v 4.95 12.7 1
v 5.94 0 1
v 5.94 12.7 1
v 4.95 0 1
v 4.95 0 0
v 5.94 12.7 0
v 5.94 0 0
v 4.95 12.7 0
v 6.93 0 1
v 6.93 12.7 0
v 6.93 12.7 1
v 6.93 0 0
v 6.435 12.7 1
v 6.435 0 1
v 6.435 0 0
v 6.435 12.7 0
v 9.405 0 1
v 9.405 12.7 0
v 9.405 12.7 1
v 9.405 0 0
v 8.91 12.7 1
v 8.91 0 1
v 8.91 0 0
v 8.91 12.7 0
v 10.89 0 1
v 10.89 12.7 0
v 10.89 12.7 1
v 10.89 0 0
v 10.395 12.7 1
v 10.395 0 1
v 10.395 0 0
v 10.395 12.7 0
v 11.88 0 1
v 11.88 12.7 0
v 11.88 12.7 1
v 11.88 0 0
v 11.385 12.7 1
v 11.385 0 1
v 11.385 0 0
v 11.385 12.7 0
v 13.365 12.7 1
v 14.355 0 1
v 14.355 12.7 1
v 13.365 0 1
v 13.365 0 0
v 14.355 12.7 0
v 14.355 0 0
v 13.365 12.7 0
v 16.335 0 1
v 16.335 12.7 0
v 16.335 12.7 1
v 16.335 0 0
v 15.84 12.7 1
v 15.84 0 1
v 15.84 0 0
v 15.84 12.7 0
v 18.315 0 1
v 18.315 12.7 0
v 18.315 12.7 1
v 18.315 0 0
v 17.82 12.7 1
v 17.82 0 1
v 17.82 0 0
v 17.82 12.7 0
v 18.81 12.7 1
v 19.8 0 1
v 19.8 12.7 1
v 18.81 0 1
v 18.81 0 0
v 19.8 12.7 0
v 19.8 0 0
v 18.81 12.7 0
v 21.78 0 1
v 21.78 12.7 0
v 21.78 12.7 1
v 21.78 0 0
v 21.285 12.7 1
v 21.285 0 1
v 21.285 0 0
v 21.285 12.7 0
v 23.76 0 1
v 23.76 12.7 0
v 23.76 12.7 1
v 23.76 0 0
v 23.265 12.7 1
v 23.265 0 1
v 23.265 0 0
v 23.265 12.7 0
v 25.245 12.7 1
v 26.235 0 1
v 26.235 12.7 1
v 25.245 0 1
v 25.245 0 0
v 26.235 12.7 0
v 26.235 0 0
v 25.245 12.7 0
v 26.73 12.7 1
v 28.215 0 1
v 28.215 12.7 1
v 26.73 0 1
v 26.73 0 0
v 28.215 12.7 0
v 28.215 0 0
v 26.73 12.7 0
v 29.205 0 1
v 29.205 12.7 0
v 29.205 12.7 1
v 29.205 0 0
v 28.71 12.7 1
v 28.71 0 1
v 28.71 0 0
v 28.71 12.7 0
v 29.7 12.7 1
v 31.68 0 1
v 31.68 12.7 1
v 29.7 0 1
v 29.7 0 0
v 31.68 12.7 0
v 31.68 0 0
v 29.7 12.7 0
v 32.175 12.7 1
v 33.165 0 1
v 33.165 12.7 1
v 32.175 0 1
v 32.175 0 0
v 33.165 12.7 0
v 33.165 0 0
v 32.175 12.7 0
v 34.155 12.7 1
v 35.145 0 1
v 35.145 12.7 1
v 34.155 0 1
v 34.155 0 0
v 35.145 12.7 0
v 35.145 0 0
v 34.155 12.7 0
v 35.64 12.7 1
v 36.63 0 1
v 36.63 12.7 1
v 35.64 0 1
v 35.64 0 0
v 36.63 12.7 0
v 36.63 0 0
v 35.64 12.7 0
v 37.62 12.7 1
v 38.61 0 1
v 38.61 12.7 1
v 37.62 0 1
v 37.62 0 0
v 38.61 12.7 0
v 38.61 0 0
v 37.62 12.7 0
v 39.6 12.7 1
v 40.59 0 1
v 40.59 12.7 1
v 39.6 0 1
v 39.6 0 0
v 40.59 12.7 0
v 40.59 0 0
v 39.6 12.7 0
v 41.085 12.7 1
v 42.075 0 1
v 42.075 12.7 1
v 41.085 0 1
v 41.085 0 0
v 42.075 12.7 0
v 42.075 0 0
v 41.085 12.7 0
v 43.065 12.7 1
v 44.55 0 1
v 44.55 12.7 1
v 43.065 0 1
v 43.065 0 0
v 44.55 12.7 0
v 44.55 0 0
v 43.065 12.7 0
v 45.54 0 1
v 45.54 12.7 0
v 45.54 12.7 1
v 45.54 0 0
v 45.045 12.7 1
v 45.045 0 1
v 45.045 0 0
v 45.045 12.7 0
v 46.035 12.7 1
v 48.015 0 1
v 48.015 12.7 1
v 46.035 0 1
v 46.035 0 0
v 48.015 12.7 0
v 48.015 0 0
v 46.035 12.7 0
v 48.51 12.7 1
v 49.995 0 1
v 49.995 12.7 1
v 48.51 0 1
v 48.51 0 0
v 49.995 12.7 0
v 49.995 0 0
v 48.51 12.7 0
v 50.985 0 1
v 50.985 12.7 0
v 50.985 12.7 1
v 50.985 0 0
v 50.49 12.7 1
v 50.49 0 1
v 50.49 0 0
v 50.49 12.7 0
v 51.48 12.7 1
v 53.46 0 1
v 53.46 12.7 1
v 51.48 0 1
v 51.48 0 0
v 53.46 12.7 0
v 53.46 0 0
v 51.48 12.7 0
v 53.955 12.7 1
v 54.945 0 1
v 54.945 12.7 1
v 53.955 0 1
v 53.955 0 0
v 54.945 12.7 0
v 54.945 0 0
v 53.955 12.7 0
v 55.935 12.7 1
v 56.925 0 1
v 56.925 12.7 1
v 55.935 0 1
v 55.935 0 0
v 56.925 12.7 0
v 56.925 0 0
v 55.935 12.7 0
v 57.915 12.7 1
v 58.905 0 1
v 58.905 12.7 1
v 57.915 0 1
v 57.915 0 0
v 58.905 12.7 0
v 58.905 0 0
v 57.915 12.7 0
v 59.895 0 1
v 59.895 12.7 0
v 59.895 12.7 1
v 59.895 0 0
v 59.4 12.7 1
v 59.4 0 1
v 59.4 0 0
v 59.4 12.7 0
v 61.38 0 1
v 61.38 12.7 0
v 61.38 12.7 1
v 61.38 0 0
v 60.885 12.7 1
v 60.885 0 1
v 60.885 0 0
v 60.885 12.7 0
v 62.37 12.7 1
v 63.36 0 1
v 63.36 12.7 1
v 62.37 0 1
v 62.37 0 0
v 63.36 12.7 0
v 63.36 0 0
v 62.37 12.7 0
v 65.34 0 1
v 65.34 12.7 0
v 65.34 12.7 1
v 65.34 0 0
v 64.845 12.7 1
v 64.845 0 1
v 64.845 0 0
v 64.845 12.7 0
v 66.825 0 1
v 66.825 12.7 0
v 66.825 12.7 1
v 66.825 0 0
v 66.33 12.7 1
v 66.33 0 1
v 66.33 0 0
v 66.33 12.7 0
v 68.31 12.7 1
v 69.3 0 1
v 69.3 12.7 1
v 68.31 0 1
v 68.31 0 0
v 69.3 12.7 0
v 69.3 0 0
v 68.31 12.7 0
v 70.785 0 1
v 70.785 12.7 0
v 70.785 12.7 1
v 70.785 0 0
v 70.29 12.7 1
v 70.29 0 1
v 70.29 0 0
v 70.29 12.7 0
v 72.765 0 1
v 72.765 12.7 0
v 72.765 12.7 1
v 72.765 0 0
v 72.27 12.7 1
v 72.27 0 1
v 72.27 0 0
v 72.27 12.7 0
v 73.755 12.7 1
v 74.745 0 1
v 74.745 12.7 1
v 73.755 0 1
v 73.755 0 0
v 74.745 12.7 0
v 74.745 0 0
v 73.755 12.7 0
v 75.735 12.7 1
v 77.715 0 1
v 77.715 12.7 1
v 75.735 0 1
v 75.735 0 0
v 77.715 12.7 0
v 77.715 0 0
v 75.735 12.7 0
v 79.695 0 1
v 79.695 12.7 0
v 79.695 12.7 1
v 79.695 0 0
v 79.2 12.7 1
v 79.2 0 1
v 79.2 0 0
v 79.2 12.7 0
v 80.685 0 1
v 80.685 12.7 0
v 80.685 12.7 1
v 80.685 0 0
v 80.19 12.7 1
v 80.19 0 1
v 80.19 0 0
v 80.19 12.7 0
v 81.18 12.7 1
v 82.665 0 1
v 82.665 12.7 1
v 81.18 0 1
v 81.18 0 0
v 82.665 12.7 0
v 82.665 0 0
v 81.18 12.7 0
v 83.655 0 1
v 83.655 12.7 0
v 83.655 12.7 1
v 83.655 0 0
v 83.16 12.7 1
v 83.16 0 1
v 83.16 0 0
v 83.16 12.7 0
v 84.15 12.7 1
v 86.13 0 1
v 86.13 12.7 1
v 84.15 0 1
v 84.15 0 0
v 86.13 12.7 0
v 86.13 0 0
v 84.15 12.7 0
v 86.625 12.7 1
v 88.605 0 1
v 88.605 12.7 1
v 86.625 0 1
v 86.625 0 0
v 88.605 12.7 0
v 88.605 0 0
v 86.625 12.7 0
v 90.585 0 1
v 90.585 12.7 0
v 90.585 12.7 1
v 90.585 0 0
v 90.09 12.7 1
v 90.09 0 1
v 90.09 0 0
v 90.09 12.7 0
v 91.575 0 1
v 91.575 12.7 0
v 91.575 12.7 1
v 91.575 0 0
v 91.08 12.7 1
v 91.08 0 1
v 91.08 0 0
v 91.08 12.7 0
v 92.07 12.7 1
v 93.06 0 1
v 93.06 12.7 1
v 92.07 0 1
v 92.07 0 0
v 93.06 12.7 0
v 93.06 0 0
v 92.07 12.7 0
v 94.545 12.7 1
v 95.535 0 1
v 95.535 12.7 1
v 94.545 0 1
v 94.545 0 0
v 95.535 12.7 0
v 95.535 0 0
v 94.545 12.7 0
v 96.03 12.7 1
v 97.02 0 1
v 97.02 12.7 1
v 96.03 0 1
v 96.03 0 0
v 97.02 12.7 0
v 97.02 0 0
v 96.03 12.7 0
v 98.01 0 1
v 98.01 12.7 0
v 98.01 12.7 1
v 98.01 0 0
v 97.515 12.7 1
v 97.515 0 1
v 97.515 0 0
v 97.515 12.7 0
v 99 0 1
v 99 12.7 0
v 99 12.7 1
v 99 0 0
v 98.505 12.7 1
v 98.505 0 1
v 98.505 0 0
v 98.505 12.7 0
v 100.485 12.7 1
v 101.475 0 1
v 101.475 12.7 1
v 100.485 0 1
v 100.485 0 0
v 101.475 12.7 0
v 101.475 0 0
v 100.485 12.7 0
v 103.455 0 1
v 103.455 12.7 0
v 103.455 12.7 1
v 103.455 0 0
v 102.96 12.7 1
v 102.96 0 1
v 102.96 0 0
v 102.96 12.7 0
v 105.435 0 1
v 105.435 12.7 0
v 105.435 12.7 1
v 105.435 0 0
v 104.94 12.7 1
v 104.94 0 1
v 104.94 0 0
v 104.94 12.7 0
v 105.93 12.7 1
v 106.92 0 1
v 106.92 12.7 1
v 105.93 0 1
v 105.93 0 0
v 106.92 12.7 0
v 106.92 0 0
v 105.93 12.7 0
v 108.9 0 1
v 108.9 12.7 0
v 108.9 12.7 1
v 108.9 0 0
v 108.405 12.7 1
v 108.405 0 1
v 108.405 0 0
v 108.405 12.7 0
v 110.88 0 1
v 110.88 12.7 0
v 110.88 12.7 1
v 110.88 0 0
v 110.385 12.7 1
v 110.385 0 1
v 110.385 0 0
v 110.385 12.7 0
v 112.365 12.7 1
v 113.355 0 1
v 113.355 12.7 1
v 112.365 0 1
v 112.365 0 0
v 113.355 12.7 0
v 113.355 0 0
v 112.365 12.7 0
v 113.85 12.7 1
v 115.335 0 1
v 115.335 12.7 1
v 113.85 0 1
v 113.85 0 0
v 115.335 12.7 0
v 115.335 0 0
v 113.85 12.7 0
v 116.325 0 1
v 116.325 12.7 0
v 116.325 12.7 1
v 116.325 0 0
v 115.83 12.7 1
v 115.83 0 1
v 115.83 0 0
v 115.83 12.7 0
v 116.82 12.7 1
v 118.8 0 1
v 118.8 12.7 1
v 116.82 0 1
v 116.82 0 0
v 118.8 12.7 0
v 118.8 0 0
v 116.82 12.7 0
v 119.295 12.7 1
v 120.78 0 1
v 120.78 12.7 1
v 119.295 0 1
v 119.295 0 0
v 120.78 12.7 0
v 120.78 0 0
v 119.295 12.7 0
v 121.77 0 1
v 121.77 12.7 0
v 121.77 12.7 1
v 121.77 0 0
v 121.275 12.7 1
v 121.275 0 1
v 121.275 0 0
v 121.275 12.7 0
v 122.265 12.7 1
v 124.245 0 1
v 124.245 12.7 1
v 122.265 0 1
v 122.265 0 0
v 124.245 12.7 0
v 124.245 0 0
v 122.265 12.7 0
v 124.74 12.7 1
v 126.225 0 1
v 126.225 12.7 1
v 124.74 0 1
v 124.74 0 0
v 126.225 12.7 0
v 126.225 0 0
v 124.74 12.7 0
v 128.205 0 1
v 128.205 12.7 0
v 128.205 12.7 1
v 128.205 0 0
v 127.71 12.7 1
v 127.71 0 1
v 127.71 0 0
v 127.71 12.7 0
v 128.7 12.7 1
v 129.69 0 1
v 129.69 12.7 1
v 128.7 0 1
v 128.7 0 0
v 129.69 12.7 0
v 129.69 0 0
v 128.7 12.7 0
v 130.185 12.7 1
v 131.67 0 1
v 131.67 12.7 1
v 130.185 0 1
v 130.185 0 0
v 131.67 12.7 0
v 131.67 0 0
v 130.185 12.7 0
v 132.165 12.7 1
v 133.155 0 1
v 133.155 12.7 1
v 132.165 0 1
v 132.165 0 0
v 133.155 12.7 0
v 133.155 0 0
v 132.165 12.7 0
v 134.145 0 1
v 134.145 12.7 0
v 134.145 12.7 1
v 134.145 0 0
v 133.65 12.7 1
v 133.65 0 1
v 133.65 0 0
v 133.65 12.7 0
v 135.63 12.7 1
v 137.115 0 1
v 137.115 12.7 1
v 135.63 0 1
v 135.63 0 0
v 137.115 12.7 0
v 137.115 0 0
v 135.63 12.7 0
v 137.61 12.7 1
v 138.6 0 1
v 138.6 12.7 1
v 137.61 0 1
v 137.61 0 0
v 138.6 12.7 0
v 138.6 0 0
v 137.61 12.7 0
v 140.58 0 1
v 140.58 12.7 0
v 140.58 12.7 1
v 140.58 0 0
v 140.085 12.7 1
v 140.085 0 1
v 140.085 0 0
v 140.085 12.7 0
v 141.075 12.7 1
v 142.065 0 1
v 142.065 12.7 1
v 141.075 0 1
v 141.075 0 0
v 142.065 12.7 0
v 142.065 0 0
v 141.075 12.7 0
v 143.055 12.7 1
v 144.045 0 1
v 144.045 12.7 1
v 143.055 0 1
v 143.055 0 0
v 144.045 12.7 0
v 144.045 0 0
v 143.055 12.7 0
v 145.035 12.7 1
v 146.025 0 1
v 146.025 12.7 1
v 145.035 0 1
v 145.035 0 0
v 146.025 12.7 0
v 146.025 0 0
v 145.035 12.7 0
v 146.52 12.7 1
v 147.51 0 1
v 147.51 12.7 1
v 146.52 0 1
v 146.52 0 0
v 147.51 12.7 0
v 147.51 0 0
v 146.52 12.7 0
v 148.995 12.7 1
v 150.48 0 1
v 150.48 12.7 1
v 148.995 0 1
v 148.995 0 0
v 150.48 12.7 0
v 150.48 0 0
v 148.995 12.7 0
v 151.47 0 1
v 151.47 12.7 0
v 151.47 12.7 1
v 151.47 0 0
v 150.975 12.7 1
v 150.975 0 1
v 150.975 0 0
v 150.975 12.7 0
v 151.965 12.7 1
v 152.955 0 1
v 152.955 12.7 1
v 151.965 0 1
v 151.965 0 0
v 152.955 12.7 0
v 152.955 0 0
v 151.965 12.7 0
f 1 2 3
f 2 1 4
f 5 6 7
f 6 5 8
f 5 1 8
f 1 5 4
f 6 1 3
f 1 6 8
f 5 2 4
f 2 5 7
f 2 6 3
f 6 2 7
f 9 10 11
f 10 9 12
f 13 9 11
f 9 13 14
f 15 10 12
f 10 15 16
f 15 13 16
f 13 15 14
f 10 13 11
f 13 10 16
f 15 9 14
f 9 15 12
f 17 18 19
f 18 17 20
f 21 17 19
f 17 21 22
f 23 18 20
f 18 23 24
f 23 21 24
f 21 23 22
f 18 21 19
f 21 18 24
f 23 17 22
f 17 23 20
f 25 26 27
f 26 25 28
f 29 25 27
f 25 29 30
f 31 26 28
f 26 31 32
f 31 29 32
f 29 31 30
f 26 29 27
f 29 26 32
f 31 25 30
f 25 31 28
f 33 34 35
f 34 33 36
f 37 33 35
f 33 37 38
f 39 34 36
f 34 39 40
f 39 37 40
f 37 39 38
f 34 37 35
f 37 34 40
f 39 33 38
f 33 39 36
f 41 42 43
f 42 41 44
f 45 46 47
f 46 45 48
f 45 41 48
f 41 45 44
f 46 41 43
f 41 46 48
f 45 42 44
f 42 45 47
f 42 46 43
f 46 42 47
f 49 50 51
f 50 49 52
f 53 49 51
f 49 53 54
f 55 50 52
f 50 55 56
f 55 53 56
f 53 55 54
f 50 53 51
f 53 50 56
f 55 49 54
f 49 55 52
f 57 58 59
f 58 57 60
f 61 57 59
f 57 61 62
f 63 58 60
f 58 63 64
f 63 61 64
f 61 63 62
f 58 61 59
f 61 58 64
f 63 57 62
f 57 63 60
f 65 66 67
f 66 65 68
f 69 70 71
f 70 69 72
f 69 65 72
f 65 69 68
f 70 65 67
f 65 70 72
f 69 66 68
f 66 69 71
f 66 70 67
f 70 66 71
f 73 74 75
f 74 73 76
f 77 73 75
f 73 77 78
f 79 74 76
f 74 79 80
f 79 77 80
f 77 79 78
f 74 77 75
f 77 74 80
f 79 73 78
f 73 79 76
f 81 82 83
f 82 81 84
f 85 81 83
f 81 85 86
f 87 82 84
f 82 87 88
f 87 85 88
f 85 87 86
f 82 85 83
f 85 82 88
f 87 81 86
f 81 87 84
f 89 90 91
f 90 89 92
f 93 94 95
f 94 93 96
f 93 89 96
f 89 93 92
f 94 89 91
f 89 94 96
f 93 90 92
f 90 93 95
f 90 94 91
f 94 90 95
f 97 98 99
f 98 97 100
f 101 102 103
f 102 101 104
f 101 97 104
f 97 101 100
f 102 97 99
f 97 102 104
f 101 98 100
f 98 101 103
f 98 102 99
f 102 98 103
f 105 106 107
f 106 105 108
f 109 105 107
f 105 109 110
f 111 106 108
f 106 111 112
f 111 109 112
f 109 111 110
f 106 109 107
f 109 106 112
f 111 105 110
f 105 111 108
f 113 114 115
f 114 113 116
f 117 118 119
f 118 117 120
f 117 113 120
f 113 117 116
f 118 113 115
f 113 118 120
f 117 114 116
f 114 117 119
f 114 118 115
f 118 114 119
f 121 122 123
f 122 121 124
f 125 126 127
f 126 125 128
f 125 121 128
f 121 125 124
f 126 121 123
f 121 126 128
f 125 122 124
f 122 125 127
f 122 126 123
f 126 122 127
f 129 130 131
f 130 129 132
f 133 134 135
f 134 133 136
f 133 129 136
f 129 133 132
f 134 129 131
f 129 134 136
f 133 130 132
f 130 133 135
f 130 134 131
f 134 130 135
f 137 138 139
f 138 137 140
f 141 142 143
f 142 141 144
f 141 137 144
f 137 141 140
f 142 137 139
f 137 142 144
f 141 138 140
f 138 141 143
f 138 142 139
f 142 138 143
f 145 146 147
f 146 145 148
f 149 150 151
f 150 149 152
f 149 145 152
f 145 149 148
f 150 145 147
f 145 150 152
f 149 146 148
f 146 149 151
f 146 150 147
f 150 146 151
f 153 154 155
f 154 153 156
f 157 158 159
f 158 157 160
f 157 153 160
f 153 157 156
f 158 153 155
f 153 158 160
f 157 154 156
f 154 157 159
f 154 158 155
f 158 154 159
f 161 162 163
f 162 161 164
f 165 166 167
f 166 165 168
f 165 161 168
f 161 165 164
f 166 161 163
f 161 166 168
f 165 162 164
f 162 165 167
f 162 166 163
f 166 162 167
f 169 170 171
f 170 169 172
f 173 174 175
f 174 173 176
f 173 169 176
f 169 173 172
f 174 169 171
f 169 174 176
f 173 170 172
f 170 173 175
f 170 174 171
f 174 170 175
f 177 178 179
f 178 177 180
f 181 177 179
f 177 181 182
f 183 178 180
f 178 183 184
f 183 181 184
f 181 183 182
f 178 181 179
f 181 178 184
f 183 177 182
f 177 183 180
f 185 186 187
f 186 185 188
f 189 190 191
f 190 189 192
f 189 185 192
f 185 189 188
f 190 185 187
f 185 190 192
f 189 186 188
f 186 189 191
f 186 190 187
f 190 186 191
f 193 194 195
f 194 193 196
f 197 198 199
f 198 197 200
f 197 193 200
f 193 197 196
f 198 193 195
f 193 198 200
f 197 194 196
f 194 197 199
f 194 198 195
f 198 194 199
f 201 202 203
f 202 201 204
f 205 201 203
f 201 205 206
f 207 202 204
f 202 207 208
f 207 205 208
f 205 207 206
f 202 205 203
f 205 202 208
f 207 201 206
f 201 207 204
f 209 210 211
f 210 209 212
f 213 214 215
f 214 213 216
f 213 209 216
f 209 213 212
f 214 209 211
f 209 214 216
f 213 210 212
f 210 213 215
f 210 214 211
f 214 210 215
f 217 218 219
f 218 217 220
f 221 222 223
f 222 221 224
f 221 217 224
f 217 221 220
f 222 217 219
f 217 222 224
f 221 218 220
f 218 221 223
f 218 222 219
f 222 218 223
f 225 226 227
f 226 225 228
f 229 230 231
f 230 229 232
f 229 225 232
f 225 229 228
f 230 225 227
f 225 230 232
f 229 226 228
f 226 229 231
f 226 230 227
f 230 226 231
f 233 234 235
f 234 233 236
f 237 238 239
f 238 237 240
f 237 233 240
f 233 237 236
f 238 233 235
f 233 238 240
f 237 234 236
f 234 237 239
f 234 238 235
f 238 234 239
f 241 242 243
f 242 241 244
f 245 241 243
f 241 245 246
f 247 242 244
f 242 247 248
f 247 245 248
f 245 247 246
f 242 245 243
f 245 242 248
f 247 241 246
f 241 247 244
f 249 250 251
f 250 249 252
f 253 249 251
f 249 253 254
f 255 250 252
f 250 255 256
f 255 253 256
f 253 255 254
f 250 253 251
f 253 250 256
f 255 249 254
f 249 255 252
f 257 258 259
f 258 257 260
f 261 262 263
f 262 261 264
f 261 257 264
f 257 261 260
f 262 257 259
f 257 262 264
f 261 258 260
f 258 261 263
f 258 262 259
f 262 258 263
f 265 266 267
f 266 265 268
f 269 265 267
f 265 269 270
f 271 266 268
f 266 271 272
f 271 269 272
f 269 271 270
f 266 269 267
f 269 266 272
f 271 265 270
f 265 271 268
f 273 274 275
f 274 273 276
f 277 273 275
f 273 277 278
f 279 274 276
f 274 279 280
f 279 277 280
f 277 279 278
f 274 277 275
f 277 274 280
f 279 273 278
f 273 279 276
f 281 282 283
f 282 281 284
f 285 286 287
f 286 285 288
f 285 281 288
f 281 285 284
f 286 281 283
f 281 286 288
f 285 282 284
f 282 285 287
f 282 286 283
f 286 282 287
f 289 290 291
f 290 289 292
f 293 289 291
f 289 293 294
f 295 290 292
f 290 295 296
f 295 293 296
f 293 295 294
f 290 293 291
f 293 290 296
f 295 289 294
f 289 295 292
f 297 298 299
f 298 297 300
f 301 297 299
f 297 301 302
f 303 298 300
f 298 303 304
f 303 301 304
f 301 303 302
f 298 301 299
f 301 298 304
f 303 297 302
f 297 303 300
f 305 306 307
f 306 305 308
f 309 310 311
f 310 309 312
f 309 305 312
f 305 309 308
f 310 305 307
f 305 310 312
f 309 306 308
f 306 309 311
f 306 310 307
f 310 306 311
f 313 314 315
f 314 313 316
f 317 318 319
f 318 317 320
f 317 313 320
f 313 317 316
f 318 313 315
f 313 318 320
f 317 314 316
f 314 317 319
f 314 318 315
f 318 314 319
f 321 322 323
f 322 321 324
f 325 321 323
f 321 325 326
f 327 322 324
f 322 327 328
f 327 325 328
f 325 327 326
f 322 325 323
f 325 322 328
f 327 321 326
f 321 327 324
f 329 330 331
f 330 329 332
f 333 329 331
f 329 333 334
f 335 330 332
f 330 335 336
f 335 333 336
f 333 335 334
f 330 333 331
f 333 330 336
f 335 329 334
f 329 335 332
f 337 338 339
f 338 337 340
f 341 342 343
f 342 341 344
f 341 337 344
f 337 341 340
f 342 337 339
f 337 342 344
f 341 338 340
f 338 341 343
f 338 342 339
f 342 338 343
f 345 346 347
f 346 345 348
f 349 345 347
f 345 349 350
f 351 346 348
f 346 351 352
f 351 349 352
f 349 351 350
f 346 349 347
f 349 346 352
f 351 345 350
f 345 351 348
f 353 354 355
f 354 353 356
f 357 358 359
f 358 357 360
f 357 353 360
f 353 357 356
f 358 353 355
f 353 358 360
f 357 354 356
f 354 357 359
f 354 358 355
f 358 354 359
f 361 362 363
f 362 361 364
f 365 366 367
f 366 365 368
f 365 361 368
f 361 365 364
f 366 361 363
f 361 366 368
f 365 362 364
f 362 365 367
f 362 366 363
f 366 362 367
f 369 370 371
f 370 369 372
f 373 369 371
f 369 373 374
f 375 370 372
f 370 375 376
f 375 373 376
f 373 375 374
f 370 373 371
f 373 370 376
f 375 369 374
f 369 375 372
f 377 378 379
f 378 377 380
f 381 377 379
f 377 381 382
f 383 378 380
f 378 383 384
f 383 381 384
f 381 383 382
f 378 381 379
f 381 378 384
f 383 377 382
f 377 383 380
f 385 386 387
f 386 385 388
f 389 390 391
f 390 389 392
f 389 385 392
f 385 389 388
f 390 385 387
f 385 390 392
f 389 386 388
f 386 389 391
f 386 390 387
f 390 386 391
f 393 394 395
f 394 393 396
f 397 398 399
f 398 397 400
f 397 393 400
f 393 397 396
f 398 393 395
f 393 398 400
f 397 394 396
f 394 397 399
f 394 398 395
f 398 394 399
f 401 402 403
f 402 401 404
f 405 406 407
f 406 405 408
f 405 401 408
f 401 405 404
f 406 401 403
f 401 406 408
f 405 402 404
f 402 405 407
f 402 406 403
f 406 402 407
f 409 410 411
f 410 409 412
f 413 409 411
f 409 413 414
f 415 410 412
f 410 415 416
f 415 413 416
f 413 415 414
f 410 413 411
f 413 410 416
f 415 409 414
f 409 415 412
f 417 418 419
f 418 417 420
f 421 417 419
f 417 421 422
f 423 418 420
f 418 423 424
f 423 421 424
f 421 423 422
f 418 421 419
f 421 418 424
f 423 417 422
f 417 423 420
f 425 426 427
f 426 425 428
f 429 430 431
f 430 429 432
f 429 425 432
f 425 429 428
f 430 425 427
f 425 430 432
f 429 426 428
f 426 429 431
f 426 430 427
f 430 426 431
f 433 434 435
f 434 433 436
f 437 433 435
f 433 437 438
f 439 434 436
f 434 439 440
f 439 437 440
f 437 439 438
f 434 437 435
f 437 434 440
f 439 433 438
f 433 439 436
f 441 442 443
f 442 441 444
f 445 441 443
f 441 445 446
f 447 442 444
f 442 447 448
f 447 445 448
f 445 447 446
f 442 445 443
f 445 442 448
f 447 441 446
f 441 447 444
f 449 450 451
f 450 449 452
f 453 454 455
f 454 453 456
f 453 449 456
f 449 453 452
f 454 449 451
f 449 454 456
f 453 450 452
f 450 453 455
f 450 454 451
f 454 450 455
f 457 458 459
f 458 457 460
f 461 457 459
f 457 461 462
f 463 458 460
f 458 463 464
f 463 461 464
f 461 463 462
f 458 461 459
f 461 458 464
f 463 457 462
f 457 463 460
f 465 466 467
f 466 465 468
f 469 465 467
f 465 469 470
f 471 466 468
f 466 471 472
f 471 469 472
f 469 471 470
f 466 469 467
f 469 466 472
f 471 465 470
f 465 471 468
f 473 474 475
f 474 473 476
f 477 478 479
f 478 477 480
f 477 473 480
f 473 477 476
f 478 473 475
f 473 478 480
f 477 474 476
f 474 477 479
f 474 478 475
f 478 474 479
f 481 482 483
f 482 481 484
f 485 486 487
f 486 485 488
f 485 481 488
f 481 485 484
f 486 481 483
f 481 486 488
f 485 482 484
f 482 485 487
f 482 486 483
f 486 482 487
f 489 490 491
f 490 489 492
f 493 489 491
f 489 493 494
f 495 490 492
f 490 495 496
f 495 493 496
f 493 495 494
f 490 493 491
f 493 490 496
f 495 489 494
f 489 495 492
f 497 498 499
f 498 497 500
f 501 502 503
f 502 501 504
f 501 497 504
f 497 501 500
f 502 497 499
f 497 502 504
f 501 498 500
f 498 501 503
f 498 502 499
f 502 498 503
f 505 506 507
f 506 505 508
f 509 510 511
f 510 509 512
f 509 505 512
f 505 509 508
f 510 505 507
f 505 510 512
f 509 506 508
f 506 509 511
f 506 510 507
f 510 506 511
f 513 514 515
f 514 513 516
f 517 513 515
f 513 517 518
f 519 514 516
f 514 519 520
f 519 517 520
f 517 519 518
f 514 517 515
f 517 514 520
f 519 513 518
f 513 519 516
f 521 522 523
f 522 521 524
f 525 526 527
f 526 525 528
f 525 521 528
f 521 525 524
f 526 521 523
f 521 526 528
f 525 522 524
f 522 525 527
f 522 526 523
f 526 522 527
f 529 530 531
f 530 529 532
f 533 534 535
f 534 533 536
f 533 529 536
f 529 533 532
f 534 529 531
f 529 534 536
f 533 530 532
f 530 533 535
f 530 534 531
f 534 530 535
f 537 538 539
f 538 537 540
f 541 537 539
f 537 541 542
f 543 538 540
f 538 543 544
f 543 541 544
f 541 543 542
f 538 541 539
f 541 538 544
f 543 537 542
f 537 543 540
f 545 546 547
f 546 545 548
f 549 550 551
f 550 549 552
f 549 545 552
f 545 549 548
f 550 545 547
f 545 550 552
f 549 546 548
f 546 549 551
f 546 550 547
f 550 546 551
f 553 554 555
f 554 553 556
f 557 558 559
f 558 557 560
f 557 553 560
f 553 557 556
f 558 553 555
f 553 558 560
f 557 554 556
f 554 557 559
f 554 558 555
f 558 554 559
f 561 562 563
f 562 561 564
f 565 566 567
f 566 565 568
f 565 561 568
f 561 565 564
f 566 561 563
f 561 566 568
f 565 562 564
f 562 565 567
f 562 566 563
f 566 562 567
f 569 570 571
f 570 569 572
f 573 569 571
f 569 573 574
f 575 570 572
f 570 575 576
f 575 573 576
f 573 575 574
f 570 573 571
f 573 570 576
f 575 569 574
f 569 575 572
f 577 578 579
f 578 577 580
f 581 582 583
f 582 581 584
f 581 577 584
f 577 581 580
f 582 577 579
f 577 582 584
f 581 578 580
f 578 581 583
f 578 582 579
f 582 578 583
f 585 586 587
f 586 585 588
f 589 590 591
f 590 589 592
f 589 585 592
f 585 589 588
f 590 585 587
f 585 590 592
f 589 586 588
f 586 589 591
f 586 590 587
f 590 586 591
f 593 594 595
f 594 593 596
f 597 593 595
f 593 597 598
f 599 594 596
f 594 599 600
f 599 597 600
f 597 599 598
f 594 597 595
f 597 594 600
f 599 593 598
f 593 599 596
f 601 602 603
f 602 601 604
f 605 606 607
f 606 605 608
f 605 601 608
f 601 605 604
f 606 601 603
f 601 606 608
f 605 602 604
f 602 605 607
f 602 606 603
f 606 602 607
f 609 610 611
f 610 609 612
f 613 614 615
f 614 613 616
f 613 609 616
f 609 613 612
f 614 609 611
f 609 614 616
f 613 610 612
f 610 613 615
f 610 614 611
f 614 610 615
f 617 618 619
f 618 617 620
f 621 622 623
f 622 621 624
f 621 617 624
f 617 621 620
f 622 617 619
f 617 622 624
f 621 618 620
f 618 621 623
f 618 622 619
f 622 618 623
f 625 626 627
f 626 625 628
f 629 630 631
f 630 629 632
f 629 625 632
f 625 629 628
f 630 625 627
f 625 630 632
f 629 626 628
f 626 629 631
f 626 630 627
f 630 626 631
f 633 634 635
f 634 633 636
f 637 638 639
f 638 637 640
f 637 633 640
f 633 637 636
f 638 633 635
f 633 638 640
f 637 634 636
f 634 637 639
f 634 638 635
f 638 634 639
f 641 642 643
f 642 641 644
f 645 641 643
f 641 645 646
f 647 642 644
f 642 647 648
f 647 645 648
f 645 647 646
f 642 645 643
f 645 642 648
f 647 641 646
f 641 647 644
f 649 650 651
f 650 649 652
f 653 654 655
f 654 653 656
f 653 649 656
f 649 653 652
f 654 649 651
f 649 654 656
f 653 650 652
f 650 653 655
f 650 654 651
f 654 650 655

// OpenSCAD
// file: ../../util/bitmap.scad
/*****************************************************************************
 * Module Bitmap Library
 * Modules to create bitmaps of unit squares from 1 or 2 dimensional vectors.
 *****************************************************************************
 * Copyright 2017 Chris Baker
 *
 * This program is free software: you can redistribute it and/or modify
 * it under the terms of the GNU Lesser General Public License as published by
 * the Free Software Foundation, either version 3 of the License, or
 * (at your option) any later version.
 *
 * This program is distributed in the hope that it will be useful,
 * but WITHOUT ANY WARRANTY; without even the implied warranty of
 * MERCHANTABILITY or FITNESS FOR A PARTICULAR PURPOSE.  See the
 * GNU Lesser General Public License for more details.
 *
 * You should have received a copy of the GNU Lesser General Public License
 * along with this program.  If not, see <http://www.gnu.org/licenses/>.
 *****************************************************************************
 * Usage:
 * Include this file with the "use" tag.
 * Depends on compat.scad library.
 *
 * API:
 *   1dbitmap(bitmap, center, expansion, vector_mode)
 *   2dbitmap(bitmap, center, expansion, vector_mode)
 *     Generate a 1 or 2-Dimensional field of modules based on the provided
 *     bitmap vector. See Bitmap Vectors below.
 *     The center flag determines whether to center the bitmap on the origin.
 *     The expansion value actually shrinks each cube in the x and y
 *     dimension by the specified amount.
 *     The vector_mode flag determines whether to create 3D solid geometry
 *     (unit cubes) or 2D vector geometry (squares).
 *
 * Bitmap Vectors:
 *   The bitmap vectors primarily provide boolean information.
 *   A module will be placed where these vectors have a postive value and
 *   skipped where they have a negative value. I.E. 0, -1, false, and undef
 *   are all equivalent and result in a skip. 1 and true are equivalent and
 *   result in a placed 1-unit module.
 *   Further, if the value is an integer it will be treated as a height for
 *   the module, allowing z-maps to be created.
 *   If the value is not an integer or boolean, it will be treated as a color
 *   reference. This can be a string or RGBA vector that will be used to
 *   color the module in the OpenSCAD preview window.
 *   In current versions of OpenSCAD, the color has no effect in the rendered
 *   view or STL output.
 *
 * Vector Mode:
 *   Although OpenSCAD supports generating 2D geometry, there are several
 *   caveats:
 *   - 2D and 3D geometry cannot be mixed
 *   - Extruding 2D geometry causes color information to be lost
 *   - All 2D geometry is projected onto the XY plane when rendering
 *   - Rendering also results in loss of color (same as 3D)
 *   - The SVG exporter is somewhat limited:
 *     - The pixel size of the image is hard-coded in the file
 *     - The title of the image is a generic string
 *     - The color selection for stroke and fill is fixed
 *     - The stroke-width is set to a large value that will cause overlap
 *     - The background is transparent
 *     - Only one path element is created with all of the geometry; there is
 *       no easy way to split up the geometry into multiple logical units.
 *     - These issues can mostly be resolved by hand-editing the file:
 *       - Remove or modify the width and height parameters from the svg
 *         element at the top of the file to provide better scaling.
 *       - Edit the title element at the top of the file to change the title.
 *       - Edit the stroke and fill parameters of the path element (these will
 *         probably be at the end of the file).
 *       - Set the stroke-width parameter for the path element to 0.
 *****************************************************************************/
use <compat.scad>

/*
 * 2dbitmap - Turn a 2D vector into a bitmap of cubes
 *
 * bitmap - 2D vector representing where to place each cube
 *          Value can either be boolean, z-height, or color
 * center - center cubes around the origin
 * expansion - size of gap around each pixel (screendoor)
 * vector_mode - create a 2D vector drawing instead of 3D extrusion
 */
module 2dbitmap(bitmap=[[1,0],[0,1]], center=false, expansion=0, vector_mode=false)
{
	ylen=len(bitmap)-1;

	for (y=[0:ylen]) {
		xlen=len(bitmap[y])-1;
		for (x=[0:xlen])
			translate([x-(center?xlen/2:0),ylen-y-(center?ylen/2:0),0])
				if (is_indexable(bitmap[y][x]))
					color(bitmap[y][x])
						if (vector_mode)
							square([1-expansion,1-expansion], center=center);
						else
							cube([1-expansion,1-expansion,1], center=center);
				else
					if (bitmap[y][x])
						if (vector_mode)
							square([1-expansion,1-expansion], center=center);
						else
							cube([1-expansion,1-expansion,clamp_nonnum(bitmap[y][x])], center=center);
	}
}

module 1dbitmap(bitmap=[1,0,1,0,1], center=false, expansion=0, vector_mode=false)
	2dbitmap([bitmap], center, expansion, vector_mode);

/*
 * Examples
 */

// 1D with z-height
translate([10,0,0]) scale([1,10,1])
	1dbitmap(bitmap=[1,1,0,2,0,0,3], expansion=.1);

// 1D with boolean
translate([-20,0,0]) scale([1,10,1])
	1dbitmap(bitmap=[true,false,true,false,true,true]);

// 2D with z-height
scale([2,2,1])
	2dbitmap(bitmap=[[1,0,2,1],[0,3,3,0],[1,1,0,1]],
		center=true);

// 1D with color
translate([0,-10,0]) scale([1,3,1])
	1dbitmap(bitmap=["red","white","blue",[0,0.3,0,0.5]]);

// 1D with color using 2D-vector-mode
translate([-7,-8,0]) scale([1,2])
	1dbitmap(bitmap=["red",0,"blue",0,"green"], vector_mode=true);
translate([-4.5,-10,0]) scale([1,2])
	1dbitmap(bitmap=["red",0,"blue",0,"green"], vector_mode=true, center=true);
// main file
/* Unit Test 10: FNC4 High ASCII */
use <../code128.scad>

code_128(cs128_a(str(
		"ABC",
		FNC4(), cs128_fnc4_high_helper("¡"),
		"!",
		cs128_fnc4_high_helper(str(
			FNC4(), FNC4(), "¢£¤¥Þ", FNC4()
		)), "^",
		cs128_fnc4_high_helper("ÀÁÂÃ"), FNC4(), FNC4(),
		"XYZ"
	)),
	bar="black");
